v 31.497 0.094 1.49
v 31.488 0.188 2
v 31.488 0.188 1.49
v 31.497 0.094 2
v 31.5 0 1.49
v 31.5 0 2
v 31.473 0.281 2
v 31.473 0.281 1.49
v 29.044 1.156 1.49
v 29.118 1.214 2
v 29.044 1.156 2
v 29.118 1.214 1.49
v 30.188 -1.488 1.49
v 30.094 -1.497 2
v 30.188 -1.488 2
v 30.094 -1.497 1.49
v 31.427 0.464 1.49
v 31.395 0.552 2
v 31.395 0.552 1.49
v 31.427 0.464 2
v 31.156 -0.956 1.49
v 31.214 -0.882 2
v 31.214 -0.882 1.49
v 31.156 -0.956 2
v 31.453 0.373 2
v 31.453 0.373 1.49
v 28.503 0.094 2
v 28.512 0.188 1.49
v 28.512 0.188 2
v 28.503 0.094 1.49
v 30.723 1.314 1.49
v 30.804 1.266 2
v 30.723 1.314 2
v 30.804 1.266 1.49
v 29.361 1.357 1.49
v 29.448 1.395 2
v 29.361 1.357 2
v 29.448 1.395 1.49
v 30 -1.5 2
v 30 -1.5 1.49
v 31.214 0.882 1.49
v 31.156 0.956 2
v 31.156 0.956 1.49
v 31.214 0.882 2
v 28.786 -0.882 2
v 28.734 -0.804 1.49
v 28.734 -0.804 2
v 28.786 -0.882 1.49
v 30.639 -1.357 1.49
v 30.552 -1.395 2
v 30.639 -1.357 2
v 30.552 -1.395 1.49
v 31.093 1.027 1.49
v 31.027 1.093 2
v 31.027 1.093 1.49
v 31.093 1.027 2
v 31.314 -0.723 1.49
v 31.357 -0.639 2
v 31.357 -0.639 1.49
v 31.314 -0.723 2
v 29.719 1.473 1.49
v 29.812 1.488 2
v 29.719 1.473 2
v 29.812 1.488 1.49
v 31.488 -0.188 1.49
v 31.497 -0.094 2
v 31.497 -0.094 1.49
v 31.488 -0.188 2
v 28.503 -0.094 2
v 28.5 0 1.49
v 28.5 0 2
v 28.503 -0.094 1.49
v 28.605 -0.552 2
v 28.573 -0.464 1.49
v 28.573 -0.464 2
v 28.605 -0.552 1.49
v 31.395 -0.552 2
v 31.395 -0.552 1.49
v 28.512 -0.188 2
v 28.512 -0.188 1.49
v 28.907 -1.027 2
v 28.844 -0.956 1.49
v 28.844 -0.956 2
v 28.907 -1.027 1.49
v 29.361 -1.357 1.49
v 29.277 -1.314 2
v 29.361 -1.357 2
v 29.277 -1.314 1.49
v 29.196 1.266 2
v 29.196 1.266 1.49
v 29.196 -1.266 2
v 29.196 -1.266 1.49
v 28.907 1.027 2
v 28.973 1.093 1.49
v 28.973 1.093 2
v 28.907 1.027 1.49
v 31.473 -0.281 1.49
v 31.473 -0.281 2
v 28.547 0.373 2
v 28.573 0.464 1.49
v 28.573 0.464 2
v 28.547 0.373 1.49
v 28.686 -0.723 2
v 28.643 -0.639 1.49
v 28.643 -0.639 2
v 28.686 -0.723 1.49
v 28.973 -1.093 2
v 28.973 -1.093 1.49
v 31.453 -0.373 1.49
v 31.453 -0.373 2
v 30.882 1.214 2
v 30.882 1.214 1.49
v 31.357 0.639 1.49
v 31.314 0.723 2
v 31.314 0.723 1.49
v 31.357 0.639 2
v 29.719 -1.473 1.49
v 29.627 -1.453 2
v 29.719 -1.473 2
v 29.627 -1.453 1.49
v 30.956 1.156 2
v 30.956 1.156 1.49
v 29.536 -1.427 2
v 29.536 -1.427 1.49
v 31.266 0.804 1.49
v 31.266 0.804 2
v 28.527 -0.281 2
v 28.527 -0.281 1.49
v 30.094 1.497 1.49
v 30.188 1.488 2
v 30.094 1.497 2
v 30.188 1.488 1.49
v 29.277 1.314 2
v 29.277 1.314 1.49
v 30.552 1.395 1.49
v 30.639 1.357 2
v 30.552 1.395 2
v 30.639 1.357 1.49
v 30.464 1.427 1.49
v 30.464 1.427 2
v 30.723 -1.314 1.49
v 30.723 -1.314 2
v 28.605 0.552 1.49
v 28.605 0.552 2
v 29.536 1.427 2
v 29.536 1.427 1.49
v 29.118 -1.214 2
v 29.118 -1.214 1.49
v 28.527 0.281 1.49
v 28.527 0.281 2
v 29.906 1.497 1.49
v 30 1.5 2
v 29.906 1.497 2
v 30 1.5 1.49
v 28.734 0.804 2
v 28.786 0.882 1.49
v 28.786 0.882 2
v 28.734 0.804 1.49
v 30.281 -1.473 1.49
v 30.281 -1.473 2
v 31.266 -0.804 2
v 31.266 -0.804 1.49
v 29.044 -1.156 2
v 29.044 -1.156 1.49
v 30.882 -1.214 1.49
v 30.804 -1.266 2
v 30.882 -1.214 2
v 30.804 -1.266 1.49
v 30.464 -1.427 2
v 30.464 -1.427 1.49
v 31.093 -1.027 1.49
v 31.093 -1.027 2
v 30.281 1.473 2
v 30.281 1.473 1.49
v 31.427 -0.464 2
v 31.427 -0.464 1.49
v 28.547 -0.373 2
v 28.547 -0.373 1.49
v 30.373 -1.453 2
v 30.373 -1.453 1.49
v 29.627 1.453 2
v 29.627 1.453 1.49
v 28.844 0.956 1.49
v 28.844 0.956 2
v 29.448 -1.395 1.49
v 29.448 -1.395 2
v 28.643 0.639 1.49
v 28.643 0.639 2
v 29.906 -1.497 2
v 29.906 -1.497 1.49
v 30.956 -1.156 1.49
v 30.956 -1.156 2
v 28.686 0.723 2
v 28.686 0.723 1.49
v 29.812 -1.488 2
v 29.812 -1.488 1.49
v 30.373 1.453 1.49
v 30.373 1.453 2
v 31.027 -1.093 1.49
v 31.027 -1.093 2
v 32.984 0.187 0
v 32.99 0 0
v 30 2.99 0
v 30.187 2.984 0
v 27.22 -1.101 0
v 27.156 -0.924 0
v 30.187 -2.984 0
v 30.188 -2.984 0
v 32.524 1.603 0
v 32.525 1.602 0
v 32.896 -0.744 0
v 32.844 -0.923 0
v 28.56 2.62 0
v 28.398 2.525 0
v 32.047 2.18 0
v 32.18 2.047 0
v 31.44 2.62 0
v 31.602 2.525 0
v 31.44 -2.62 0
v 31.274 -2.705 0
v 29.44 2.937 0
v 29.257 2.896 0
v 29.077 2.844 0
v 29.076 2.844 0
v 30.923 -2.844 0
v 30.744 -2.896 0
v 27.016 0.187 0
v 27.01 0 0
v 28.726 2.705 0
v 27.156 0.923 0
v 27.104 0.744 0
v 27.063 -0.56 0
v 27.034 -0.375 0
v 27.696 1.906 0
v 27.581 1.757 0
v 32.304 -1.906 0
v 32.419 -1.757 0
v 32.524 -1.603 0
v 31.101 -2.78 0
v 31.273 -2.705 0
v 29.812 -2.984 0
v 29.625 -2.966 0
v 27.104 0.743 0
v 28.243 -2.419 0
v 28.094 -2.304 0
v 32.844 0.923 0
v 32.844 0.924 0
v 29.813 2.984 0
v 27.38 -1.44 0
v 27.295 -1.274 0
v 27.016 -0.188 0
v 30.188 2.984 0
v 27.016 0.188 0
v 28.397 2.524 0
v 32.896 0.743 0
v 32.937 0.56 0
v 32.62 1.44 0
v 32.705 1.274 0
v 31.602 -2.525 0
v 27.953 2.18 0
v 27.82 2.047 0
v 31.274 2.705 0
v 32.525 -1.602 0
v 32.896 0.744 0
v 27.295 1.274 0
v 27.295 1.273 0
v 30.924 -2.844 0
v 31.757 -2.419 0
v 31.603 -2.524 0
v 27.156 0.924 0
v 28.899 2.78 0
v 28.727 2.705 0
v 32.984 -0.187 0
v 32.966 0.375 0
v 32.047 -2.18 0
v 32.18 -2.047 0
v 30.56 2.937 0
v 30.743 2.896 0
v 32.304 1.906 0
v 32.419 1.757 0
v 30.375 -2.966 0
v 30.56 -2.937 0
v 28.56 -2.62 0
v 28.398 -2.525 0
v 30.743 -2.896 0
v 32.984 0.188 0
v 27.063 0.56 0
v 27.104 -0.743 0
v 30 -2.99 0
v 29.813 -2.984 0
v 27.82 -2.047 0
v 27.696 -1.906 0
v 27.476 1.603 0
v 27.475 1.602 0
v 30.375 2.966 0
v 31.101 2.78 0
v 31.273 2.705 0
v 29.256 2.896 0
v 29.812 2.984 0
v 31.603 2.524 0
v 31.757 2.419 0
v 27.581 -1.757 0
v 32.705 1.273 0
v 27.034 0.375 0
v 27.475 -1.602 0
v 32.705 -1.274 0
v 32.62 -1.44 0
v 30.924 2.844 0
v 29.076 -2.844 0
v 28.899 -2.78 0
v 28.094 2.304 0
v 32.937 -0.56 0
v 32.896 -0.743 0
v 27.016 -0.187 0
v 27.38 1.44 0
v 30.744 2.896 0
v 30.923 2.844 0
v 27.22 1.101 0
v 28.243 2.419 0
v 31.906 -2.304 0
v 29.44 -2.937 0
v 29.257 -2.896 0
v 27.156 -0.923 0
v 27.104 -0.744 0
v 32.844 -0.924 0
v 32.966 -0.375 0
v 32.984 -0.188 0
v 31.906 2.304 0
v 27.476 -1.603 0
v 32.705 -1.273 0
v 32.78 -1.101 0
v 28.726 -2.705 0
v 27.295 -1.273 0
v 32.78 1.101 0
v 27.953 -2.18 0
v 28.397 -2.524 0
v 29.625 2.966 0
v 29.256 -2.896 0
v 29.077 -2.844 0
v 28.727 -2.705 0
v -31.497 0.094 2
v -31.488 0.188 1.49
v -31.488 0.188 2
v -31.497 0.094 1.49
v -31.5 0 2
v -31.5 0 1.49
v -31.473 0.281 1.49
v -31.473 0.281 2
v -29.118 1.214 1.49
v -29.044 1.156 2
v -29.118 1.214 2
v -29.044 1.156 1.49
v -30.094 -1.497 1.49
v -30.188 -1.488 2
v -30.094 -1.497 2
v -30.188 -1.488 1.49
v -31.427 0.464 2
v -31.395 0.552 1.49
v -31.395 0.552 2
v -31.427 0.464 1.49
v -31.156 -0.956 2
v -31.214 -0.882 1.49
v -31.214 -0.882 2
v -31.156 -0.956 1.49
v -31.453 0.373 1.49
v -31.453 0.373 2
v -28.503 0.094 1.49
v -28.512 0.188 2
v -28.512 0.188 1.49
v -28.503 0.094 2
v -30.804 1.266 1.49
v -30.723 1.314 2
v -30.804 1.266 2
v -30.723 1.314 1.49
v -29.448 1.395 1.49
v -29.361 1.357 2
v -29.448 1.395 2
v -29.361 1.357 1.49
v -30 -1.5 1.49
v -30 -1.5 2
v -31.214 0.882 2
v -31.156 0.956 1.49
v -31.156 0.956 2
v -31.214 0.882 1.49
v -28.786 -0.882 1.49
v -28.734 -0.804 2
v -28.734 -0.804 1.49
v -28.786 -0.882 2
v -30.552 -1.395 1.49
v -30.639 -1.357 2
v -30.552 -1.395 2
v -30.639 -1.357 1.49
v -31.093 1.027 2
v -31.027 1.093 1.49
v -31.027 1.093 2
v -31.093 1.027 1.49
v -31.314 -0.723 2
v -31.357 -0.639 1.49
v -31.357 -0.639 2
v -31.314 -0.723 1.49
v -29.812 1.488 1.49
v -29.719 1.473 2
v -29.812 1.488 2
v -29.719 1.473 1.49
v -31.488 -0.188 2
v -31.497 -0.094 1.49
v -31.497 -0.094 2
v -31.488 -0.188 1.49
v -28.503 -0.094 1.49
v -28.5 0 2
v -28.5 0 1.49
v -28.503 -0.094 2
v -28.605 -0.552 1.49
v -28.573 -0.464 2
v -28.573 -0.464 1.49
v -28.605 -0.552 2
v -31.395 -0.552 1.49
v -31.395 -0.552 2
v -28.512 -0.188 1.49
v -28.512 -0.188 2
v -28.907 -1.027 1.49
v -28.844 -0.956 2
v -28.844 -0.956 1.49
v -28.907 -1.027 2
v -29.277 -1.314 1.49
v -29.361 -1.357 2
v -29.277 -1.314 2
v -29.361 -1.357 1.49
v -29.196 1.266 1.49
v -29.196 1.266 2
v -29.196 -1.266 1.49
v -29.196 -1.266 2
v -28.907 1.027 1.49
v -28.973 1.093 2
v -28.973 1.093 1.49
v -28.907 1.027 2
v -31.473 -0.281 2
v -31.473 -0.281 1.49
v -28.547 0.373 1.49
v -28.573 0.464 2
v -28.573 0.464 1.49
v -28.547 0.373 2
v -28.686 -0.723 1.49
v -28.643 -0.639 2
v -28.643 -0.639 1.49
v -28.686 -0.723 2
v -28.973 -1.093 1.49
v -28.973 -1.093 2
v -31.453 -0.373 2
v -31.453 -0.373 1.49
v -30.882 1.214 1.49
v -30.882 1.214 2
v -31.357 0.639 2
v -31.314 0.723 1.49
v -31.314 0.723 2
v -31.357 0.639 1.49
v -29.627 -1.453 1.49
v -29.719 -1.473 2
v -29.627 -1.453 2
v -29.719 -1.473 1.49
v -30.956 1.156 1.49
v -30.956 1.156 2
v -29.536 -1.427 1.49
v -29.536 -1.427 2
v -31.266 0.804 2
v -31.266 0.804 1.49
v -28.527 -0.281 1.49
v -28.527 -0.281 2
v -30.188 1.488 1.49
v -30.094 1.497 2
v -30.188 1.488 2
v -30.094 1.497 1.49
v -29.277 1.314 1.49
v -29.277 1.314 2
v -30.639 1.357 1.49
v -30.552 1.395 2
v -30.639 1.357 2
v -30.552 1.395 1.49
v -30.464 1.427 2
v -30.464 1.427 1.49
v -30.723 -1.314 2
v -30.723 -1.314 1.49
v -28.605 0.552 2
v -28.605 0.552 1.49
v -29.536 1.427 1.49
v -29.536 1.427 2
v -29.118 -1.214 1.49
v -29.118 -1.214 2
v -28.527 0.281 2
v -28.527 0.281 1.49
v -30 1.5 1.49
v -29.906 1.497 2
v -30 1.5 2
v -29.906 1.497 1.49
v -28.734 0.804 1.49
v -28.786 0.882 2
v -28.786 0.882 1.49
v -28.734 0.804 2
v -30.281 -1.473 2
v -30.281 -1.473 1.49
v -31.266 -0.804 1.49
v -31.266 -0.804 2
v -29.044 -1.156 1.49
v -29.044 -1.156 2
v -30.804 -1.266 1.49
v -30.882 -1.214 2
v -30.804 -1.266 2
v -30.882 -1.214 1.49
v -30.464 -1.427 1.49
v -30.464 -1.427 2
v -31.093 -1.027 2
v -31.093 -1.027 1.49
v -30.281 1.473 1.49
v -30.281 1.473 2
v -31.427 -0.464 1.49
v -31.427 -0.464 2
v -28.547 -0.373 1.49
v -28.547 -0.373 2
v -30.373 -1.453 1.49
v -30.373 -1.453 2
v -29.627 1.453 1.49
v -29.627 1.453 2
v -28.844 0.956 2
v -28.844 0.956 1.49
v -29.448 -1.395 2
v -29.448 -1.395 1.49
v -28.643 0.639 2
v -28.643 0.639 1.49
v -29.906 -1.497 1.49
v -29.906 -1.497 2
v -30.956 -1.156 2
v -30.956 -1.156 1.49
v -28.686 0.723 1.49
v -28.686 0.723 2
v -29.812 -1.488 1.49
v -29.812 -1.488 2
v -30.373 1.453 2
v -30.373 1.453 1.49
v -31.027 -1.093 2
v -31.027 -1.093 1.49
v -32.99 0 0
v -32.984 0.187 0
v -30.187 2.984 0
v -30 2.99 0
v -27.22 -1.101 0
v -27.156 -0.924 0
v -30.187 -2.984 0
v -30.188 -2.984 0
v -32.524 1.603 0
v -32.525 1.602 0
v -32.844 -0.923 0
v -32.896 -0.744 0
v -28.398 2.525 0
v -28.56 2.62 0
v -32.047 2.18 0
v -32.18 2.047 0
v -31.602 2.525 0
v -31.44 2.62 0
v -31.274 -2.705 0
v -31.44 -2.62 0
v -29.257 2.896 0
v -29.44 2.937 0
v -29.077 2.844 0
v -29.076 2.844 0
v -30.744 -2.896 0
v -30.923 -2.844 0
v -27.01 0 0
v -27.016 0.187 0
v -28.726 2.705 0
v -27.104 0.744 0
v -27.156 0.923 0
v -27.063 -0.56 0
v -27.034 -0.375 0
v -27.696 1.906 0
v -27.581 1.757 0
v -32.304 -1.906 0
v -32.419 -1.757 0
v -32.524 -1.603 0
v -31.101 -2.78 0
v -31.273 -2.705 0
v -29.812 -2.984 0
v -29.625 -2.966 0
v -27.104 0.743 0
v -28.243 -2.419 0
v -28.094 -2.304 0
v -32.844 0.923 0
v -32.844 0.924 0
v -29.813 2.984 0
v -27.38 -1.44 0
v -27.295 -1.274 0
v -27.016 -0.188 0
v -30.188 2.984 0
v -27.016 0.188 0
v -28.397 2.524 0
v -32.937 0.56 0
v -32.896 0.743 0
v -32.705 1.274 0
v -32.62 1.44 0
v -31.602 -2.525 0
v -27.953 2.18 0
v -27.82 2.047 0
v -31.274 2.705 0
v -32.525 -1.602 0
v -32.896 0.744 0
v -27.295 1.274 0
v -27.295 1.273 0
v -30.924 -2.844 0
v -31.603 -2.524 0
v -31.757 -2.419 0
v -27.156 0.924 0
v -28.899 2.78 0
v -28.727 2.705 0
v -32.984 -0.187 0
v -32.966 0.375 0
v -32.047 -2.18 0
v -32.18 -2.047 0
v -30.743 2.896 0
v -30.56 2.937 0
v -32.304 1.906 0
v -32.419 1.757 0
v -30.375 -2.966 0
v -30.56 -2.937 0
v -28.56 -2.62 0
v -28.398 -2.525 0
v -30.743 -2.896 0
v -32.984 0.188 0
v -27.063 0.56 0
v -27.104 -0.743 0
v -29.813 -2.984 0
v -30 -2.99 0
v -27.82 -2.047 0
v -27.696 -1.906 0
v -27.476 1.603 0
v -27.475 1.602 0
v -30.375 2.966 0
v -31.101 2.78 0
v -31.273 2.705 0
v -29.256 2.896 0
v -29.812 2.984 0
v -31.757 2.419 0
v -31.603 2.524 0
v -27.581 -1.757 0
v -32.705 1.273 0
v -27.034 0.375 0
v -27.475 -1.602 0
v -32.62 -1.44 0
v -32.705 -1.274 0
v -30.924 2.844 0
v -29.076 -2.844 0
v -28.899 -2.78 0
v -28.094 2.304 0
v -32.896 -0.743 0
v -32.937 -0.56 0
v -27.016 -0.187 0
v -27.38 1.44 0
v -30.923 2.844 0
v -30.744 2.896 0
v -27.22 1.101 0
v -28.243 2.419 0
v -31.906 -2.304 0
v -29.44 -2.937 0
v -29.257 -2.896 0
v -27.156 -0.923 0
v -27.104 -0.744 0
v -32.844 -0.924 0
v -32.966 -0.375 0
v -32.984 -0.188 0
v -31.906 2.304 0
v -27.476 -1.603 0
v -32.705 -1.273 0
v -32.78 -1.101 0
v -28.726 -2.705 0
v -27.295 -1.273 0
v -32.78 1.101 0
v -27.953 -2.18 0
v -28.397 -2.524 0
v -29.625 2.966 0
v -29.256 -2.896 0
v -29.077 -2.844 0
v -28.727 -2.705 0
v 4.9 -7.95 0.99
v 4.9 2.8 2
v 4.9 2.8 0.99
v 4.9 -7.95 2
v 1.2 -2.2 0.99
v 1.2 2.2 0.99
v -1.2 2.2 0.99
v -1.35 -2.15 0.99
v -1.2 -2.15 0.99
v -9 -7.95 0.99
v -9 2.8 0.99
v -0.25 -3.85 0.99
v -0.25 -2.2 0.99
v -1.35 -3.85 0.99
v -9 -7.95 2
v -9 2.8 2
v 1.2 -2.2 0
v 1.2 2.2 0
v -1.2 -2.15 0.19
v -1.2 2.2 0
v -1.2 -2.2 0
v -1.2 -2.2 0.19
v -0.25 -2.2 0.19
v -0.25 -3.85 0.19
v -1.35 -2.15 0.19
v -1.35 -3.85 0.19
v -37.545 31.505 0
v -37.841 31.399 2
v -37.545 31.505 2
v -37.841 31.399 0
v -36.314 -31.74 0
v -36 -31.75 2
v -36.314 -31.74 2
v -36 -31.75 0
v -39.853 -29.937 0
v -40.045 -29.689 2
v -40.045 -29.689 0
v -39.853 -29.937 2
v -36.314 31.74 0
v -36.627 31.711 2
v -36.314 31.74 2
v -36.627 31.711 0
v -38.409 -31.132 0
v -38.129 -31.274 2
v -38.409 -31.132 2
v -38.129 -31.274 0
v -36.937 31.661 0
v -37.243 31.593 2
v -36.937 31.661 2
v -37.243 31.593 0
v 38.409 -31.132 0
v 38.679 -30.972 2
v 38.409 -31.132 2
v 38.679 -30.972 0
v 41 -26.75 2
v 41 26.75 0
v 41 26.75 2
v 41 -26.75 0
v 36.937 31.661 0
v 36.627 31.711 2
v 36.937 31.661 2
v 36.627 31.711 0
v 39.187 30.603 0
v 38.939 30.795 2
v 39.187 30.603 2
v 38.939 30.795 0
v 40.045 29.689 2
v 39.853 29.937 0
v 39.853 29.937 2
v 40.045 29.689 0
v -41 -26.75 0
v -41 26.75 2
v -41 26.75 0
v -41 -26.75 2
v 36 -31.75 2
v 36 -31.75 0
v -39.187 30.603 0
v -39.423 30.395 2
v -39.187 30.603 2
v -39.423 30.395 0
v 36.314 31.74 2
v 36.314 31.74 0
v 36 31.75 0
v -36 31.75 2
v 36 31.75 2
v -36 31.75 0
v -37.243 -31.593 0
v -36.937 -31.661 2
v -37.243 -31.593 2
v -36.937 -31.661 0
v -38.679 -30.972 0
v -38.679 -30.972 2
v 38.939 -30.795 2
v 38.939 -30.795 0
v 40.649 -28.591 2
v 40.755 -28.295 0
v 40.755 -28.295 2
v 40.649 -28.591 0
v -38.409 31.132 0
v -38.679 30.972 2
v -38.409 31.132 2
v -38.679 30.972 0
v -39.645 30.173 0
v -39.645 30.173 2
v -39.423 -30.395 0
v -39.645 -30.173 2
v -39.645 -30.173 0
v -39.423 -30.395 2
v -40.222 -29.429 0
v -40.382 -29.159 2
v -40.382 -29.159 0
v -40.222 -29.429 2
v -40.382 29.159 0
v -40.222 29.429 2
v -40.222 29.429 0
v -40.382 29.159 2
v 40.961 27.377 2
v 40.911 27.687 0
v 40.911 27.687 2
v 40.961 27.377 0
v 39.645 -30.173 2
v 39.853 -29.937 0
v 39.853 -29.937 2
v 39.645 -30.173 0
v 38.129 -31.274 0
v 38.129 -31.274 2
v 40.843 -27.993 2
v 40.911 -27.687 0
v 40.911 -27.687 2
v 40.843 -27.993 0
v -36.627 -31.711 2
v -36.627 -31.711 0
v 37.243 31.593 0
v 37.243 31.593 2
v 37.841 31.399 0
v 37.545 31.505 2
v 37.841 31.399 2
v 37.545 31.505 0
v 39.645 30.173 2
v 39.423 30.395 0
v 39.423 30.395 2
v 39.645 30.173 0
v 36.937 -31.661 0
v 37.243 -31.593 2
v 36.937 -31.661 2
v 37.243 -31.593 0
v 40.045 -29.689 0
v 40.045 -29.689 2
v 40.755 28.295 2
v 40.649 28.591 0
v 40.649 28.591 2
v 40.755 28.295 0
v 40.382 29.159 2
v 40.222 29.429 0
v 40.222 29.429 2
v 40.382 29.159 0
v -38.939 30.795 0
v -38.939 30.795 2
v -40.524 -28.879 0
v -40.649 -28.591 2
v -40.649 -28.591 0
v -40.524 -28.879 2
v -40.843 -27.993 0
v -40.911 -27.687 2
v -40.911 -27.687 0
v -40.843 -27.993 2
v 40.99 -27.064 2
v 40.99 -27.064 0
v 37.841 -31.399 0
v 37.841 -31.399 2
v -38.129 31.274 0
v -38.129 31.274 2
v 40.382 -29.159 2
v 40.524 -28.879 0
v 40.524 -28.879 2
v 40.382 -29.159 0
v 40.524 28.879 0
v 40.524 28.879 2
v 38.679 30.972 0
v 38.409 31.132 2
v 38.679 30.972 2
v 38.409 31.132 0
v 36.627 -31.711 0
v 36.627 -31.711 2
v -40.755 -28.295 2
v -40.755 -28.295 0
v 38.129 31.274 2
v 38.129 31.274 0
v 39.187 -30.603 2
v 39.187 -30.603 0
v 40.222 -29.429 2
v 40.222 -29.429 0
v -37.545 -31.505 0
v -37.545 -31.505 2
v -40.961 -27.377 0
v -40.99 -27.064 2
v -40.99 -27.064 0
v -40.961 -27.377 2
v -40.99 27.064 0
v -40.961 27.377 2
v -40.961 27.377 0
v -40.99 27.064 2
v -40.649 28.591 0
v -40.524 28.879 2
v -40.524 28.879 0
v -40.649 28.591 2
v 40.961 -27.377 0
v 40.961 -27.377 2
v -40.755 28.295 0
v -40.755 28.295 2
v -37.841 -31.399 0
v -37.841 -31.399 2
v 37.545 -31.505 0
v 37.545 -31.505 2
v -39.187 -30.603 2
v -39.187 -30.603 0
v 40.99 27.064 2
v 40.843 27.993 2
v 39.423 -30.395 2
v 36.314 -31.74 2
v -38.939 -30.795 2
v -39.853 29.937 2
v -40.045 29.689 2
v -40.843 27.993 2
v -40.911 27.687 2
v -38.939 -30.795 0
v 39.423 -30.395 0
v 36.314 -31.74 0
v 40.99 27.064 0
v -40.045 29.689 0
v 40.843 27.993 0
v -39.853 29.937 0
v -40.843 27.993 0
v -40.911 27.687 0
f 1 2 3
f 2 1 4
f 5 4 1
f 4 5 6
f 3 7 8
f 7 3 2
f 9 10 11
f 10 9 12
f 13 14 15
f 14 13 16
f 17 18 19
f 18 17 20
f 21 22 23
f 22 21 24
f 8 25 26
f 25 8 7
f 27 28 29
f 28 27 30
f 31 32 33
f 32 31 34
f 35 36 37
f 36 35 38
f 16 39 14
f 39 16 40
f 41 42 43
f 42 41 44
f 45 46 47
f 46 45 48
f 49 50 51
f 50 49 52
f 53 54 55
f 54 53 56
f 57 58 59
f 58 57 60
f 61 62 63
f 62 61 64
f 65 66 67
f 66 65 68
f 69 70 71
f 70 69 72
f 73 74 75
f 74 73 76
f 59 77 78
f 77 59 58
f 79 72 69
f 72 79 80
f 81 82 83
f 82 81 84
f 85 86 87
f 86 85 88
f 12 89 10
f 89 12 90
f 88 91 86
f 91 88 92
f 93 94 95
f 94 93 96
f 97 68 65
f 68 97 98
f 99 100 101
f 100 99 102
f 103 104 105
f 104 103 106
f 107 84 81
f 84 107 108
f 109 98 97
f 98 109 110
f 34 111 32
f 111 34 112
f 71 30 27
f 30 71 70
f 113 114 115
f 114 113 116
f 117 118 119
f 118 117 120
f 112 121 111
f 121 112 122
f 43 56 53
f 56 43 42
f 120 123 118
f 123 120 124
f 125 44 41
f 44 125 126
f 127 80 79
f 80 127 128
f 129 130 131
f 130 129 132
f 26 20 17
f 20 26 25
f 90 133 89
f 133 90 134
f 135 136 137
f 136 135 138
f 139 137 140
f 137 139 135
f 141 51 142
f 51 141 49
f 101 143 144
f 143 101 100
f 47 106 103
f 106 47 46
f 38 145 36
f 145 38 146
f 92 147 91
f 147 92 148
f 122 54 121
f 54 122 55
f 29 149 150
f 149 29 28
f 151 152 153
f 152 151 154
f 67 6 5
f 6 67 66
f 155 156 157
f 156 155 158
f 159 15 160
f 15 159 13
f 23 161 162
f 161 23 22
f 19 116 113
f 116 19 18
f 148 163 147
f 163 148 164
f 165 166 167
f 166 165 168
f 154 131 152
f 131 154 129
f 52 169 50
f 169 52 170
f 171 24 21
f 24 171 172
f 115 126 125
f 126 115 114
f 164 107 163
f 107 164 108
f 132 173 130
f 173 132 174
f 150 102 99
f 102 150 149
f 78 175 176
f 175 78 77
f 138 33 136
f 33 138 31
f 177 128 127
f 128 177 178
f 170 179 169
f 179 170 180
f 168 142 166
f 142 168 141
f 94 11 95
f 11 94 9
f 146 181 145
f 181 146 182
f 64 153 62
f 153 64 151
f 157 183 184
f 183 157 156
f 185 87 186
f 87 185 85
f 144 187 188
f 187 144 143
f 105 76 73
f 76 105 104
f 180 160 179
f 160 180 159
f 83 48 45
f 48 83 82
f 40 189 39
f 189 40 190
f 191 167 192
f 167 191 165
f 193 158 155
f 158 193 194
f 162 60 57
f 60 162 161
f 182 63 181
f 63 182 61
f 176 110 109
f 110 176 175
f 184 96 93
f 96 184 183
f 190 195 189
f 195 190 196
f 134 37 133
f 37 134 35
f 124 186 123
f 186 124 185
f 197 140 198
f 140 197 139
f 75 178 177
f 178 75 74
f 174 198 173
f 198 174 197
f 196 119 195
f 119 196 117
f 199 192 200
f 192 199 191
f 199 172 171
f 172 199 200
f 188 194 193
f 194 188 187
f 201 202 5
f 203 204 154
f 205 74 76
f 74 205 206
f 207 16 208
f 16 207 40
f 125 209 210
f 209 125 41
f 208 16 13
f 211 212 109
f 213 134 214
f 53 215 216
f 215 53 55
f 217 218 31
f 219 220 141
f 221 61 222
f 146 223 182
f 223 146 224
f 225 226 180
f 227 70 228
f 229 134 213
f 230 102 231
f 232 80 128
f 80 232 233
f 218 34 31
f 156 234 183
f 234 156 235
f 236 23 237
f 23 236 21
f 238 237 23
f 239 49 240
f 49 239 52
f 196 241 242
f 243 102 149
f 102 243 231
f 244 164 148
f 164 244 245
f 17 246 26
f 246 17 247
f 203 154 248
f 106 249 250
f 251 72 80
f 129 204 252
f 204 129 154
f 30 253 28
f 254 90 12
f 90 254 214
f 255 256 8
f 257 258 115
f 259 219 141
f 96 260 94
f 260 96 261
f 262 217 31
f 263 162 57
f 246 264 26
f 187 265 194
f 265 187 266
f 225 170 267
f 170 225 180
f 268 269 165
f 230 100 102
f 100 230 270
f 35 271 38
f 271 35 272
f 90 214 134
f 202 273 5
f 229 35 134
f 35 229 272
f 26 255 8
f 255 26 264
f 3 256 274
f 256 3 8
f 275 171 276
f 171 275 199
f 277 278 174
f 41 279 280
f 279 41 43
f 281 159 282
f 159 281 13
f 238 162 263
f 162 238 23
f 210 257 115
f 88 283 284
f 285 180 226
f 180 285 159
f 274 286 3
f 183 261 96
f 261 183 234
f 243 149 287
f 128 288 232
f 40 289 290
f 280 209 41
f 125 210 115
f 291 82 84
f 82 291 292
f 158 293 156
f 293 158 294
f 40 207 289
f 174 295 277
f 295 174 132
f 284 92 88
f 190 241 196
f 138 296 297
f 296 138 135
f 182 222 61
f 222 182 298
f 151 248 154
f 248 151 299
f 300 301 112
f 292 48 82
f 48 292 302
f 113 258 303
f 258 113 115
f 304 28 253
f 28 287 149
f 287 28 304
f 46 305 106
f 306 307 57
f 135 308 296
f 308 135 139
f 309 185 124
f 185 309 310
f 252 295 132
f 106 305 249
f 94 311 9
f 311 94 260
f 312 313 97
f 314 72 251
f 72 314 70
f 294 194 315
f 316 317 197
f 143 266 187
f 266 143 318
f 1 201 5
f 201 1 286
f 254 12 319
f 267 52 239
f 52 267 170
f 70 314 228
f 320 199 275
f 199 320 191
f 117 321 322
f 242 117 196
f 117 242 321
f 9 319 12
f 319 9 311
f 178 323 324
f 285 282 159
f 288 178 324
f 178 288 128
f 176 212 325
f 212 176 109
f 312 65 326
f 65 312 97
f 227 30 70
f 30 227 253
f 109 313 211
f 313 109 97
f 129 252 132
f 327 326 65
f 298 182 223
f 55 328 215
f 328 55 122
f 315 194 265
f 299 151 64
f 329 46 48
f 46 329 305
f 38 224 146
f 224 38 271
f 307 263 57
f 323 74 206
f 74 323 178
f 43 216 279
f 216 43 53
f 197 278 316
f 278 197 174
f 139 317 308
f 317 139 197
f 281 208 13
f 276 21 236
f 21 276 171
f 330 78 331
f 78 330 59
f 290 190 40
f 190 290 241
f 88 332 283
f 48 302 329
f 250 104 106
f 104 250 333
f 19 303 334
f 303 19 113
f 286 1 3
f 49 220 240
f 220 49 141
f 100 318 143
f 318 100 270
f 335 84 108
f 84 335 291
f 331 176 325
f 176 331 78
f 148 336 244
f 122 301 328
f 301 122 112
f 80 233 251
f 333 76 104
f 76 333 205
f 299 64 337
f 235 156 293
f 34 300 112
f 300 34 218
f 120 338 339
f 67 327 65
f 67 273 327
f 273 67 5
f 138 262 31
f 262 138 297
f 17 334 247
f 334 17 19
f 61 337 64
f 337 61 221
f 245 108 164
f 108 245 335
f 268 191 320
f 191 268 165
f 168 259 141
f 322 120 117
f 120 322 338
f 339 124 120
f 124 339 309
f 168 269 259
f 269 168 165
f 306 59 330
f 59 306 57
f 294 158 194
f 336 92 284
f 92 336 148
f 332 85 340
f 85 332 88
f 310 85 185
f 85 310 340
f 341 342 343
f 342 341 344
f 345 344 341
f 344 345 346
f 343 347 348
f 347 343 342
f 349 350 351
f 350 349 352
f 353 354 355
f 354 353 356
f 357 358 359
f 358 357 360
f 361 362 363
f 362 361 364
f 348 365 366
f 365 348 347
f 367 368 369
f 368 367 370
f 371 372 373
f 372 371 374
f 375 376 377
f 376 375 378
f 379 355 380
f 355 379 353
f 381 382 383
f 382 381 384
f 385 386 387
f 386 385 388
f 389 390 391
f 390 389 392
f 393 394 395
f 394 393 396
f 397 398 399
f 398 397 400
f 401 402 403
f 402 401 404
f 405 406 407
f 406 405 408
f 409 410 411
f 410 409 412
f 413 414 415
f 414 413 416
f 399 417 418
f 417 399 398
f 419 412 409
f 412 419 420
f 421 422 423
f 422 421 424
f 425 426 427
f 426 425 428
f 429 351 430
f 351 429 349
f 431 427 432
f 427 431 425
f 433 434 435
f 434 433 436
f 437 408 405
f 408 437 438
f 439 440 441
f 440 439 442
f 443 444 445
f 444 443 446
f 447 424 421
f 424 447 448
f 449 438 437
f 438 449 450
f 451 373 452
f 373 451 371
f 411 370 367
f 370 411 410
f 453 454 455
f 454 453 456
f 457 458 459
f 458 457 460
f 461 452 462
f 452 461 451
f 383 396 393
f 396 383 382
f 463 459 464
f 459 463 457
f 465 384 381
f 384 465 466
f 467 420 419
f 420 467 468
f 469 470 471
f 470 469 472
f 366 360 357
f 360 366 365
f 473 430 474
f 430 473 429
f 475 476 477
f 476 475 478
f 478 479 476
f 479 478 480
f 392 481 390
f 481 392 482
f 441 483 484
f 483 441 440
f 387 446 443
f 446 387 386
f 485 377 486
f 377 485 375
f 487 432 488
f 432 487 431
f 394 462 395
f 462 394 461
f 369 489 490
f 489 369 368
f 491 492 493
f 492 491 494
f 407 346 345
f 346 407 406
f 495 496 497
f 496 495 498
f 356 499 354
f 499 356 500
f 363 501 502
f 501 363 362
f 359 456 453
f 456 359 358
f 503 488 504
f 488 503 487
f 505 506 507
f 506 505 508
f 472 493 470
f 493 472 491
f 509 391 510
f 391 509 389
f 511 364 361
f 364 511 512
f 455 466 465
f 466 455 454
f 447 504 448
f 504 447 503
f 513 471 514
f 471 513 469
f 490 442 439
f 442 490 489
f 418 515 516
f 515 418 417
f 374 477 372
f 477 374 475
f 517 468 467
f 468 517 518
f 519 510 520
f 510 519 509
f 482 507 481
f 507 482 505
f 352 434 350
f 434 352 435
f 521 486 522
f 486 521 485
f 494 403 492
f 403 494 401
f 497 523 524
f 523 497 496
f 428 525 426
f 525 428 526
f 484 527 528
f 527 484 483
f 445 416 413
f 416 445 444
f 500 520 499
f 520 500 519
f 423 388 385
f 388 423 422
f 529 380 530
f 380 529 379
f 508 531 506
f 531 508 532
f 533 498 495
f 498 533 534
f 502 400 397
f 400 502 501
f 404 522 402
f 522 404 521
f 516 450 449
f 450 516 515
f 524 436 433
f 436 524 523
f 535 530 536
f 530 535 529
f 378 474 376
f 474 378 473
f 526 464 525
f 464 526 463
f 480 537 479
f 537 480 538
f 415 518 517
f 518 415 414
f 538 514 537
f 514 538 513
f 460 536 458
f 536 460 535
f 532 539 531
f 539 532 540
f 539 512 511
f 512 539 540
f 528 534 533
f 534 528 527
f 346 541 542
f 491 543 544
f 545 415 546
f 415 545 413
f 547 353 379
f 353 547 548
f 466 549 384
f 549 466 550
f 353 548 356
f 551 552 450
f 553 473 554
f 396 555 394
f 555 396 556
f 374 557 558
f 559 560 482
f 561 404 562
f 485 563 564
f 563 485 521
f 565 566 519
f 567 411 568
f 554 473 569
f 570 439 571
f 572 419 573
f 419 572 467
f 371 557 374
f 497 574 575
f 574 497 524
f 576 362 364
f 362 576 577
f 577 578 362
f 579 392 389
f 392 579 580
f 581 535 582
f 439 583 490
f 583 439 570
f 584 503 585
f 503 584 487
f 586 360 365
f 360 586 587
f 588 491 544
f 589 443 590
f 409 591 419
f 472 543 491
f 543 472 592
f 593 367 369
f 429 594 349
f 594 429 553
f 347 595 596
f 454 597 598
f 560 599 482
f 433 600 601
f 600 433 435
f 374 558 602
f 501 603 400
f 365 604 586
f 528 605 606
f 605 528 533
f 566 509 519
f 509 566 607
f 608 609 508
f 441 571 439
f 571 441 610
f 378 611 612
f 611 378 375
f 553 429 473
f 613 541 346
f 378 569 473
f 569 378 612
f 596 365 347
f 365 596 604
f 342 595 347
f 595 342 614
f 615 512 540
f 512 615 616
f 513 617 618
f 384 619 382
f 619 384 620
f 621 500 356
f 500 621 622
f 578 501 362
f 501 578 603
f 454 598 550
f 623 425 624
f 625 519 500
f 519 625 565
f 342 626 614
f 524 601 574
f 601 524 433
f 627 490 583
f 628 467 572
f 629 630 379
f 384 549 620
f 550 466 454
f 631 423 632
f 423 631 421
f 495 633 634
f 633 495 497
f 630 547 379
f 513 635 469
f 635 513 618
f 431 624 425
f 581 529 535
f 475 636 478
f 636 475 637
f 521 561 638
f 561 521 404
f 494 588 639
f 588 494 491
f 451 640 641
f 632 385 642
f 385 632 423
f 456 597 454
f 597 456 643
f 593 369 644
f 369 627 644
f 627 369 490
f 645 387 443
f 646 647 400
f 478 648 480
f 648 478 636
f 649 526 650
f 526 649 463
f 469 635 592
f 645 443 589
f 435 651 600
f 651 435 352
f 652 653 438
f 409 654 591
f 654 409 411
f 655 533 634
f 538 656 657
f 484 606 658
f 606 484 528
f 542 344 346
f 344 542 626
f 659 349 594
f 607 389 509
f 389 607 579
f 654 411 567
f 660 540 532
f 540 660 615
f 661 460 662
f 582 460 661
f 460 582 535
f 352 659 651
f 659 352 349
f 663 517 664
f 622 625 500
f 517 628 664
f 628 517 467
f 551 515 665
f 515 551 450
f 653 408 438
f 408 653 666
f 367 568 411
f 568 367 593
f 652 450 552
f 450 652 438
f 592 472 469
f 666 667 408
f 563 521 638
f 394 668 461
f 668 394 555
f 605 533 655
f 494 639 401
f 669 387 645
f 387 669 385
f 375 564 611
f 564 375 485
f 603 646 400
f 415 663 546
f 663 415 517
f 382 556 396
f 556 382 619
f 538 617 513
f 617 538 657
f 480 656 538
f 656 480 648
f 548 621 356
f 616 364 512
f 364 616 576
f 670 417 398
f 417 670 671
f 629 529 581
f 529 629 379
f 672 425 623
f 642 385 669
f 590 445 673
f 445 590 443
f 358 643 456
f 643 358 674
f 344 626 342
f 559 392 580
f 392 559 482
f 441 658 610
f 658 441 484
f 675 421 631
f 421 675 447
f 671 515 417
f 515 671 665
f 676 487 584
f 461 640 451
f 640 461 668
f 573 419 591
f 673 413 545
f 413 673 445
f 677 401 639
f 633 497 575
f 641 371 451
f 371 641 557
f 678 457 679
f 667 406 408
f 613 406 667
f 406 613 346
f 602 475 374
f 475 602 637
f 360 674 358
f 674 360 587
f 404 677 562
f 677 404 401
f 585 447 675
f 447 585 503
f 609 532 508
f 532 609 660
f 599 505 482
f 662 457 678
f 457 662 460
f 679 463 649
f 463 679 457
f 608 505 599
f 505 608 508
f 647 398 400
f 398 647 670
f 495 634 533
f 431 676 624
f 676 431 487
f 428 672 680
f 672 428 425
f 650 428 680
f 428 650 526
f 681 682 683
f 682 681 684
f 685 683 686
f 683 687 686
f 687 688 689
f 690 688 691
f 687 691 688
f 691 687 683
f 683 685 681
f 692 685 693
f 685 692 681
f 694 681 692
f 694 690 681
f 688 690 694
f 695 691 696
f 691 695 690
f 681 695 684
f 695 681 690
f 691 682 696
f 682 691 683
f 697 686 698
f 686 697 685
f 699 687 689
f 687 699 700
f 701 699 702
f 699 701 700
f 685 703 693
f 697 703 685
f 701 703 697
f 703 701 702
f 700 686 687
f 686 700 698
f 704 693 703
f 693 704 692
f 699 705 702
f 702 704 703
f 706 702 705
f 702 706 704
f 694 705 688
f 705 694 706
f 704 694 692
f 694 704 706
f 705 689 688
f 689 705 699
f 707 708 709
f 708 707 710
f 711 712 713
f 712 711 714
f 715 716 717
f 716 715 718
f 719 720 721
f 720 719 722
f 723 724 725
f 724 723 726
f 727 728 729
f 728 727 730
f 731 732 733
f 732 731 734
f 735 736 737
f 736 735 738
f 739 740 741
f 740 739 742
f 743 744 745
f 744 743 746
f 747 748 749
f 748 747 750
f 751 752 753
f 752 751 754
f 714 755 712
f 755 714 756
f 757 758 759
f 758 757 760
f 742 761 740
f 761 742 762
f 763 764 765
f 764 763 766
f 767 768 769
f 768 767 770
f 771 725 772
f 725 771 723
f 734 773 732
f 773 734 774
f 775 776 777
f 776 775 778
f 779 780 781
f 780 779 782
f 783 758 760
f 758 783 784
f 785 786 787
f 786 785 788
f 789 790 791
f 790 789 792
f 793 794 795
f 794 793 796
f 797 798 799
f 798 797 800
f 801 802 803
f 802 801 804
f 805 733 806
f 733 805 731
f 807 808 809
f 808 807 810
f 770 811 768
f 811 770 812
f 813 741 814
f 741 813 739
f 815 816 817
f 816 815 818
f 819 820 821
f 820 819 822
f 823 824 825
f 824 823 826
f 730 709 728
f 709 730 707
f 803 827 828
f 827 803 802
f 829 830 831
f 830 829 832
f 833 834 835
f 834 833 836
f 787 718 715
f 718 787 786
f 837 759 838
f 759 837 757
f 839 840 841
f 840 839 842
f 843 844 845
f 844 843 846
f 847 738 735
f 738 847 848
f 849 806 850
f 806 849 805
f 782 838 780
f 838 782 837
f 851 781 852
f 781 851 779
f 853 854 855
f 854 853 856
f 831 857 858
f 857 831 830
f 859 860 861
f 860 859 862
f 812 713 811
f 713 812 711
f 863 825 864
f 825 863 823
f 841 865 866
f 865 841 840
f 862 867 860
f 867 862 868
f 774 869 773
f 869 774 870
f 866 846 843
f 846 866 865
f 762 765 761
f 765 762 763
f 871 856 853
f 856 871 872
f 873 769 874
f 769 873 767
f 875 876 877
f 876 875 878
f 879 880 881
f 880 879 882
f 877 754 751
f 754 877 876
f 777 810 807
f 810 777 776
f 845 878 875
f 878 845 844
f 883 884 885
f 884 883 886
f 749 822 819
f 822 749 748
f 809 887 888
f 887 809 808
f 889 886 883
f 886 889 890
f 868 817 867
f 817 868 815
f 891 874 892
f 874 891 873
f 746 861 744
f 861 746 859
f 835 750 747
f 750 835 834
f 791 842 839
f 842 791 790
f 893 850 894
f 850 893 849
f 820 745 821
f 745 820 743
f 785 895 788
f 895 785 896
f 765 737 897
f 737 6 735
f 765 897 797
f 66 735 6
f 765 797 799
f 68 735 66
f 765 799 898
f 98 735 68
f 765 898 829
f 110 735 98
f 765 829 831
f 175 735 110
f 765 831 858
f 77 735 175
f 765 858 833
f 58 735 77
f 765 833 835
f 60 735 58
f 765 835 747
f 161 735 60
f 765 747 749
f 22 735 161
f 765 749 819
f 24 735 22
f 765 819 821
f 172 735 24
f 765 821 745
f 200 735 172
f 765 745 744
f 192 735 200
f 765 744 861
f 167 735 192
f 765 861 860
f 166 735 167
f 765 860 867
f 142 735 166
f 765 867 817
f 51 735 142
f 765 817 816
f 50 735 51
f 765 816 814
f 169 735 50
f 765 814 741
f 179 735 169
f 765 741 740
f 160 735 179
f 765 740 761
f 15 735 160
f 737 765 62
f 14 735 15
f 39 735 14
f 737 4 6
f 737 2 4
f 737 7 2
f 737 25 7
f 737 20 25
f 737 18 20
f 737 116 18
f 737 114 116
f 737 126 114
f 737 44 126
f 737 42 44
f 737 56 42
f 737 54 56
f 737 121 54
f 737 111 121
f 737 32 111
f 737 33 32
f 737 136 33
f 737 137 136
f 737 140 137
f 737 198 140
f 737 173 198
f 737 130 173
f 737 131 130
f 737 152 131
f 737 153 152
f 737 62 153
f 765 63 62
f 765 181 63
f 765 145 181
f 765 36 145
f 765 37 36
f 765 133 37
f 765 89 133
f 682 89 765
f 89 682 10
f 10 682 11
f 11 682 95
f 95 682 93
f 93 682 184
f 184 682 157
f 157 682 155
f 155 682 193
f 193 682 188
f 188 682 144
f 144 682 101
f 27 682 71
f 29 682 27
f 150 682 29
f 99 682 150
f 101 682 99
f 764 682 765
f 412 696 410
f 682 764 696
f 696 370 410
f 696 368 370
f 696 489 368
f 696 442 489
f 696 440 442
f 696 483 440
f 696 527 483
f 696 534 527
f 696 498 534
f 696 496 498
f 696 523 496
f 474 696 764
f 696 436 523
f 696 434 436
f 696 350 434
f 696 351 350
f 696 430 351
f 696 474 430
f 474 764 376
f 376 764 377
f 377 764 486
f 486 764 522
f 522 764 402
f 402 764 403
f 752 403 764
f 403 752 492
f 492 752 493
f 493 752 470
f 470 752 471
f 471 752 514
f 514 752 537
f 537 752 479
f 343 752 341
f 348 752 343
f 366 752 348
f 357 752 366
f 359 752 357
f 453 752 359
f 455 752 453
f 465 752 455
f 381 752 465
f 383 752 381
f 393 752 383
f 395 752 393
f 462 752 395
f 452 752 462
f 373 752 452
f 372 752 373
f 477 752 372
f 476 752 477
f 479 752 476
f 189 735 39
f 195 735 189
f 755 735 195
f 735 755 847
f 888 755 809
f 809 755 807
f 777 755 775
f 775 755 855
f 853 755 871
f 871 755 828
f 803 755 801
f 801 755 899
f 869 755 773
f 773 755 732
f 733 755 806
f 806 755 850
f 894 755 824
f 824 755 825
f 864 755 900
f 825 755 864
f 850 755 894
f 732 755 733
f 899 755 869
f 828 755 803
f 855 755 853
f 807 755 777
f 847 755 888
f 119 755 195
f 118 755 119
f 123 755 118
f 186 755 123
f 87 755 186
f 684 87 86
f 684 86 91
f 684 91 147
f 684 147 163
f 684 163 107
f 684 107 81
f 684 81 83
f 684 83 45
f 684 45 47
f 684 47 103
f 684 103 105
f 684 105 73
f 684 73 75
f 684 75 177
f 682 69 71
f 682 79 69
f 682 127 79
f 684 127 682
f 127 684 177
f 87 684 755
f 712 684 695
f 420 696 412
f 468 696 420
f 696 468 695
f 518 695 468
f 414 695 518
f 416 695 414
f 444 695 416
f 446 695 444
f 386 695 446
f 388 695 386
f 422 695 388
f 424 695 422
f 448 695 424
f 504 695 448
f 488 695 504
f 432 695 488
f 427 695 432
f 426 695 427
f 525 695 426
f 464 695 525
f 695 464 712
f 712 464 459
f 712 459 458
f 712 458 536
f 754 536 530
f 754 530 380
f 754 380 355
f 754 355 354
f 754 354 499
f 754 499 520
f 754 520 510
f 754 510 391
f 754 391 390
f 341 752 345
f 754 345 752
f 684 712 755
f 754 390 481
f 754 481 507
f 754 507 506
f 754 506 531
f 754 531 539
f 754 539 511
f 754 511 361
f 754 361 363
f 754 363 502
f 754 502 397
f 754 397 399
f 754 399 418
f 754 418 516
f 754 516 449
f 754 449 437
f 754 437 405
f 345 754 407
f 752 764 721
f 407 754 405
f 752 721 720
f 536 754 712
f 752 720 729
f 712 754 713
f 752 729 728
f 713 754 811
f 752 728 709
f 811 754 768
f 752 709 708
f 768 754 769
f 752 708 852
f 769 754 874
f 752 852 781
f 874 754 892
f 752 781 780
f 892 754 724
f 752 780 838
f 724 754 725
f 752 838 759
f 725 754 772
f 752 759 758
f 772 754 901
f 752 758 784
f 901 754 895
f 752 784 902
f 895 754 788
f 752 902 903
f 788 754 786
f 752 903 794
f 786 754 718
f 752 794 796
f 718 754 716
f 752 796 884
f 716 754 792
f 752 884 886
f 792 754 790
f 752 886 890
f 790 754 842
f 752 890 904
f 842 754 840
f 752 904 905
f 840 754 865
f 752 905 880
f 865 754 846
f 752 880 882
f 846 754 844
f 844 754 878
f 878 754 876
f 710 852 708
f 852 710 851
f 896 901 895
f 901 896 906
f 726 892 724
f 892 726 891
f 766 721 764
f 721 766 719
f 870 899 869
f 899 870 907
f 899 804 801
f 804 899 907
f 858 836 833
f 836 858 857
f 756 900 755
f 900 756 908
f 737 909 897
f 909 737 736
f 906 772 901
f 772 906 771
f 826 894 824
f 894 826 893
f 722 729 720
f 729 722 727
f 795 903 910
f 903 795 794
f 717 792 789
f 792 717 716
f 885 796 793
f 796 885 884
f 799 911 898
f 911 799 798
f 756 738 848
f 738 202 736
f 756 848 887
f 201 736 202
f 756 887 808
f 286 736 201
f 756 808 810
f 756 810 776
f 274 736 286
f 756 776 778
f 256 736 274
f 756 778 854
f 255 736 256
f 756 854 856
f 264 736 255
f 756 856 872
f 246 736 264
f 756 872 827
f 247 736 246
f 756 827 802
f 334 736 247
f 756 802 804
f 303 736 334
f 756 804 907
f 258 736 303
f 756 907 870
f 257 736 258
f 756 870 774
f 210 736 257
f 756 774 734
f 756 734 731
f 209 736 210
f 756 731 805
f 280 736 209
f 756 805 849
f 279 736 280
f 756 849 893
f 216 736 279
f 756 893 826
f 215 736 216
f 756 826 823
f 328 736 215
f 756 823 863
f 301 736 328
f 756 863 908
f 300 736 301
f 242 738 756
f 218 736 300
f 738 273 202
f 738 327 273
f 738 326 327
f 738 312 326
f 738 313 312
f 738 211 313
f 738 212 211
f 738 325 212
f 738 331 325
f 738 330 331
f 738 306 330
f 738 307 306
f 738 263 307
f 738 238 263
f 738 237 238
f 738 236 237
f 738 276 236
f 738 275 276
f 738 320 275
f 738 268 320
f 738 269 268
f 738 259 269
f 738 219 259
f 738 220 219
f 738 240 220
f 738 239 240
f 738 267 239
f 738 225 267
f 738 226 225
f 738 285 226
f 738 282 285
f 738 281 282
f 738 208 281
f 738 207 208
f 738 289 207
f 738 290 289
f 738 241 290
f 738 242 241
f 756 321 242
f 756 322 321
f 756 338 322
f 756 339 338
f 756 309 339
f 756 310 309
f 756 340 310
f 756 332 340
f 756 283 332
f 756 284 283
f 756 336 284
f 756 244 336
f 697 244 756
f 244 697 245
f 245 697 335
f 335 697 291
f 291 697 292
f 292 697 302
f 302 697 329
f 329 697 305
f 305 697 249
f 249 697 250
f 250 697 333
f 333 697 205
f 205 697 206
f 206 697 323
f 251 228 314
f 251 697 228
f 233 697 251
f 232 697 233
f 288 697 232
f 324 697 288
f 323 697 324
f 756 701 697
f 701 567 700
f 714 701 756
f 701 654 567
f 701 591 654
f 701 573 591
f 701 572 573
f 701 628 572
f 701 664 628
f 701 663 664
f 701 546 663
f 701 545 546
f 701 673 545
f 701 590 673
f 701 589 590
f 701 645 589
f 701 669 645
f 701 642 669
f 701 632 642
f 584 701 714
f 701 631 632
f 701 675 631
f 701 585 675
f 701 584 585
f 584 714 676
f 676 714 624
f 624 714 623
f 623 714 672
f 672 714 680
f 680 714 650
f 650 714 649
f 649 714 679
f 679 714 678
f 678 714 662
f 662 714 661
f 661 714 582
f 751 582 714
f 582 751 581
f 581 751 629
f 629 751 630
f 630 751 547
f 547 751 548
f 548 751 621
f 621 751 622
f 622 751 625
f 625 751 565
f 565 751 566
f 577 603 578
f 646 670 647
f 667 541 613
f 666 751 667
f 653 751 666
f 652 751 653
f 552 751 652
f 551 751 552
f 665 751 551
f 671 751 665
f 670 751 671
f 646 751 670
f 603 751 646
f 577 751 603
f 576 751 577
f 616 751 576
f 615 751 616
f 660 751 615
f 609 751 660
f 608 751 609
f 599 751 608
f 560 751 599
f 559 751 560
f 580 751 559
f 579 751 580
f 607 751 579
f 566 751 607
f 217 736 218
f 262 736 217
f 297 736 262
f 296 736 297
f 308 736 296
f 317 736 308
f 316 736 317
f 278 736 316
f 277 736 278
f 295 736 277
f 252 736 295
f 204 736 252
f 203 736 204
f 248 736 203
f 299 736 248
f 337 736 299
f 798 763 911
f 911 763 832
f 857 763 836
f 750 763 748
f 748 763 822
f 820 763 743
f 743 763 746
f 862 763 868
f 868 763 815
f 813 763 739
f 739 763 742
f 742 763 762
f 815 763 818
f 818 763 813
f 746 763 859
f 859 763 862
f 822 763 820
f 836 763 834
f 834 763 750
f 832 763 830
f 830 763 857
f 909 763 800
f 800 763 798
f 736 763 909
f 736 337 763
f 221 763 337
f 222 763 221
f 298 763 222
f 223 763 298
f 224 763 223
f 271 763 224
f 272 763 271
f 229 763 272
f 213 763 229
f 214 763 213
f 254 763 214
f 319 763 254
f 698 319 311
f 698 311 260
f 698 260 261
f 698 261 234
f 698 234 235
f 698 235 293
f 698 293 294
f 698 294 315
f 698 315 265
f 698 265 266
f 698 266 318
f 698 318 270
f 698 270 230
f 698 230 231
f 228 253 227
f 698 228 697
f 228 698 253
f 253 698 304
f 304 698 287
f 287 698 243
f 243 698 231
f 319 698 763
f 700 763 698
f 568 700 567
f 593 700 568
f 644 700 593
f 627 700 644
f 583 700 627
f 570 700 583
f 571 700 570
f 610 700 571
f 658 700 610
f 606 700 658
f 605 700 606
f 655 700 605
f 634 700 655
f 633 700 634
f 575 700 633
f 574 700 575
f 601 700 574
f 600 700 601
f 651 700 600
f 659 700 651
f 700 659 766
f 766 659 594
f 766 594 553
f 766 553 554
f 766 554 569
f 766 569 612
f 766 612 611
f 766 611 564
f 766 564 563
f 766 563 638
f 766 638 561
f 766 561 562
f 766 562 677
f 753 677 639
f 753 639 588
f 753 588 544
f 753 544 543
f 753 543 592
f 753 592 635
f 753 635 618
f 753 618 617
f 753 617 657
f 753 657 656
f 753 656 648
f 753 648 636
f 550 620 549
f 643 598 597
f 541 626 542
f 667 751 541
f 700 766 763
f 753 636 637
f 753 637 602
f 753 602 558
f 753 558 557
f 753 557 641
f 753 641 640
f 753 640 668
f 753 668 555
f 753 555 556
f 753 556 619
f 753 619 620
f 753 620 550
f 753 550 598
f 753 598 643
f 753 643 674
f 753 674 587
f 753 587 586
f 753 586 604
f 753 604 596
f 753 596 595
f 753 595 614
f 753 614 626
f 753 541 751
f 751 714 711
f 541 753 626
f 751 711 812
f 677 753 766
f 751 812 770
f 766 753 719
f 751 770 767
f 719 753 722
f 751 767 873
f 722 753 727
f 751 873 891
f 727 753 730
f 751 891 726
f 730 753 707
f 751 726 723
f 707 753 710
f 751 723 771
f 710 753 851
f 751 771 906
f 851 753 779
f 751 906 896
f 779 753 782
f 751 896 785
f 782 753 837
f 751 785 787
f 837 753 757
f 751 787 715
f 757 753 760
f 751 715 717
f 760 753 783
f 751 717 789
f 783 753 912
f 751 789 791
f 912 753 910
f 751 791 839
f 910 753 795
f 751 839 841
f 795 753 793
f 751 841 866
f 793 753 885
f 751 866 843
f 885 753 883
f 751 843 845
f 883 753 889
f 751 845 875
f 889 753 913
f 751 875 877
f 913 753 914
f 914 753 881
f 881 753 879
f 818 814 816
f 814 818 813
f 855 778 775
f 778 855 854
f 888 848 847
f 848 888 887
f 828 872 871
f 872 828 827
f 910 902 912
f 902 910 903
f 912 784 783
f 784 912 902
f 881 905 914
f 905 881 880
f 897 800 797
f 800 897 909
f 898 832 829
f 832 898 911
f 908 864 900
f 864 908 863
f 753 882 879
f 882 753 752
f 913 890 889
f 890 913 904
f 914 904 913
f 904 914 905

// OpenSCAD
// Exit button front

w=82;       // Width
h=63.5;     // Height
r=5;        // Round corners
t=2;        // Thickness
s=60;       // Screw spacing
m=3;        // Screw hole size

pcbw=13.9;
pcbh=10.75;
pcbo=1;
sensorx=9;
sensory=2.8;
sensorw=2.4;
sensorh=4.4;
resx=8.2;
resy=5.8;
resw=1.1;
resh=1.7;
rest=0.8;


difference()
{
    translate([-w/2,-h/2,0])
    minkowski()
    {
        translate([r,r,0])
        cube([w-r*2,h-r*2,t/2]);
        cylinder(r=r,h=t/2,$fn=100);
    }
    for(x=[0,1])
    mirror([x,0,0])
    translate([s/2,0,0])
    {
        translate([0,0,-1])
        cylinder(d=m,h=t+2,$fn=100);
        translate([0,0,-0.01])
        cylinder(d1=m*2,d2=m,h=m/2,$fn=100);        
    }
    mirror([0,1,0])
    translate([-sensorx,-sensory,-0.01])
    {
        translate([0,0,pcbo])
        cube([pcbw,pcbh,t]);
        translate([sensorx-sensorw/2,sensory-sensorh/2,0])
        cube([sensorw,sensorh,t+1]);
        translate([resx-resw/2,resy-resh/2,pcbo-rest])
        cube([resw,resh,t]);
    }
}
